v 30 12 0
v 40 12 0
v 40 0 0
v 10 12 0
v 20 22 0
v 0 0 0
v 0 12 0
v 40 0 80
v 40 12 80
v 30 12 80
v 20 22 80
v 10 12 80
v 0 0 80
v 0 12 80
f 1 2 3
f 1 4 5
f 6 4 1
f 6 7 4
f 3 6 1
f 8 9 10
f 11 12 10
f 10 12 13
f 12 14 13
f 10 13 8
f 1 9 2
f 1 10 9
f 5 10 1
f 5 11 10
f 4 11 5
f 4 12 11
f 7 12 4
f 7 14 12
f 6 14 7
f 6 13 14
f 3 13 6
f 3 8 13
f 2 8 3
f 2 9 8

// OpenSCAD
$fn = 32;

// ----------------------------------------------------------------------
// V guide rail: vrib, 40 mm wide
// ----------------------------------------------------------------------

// --- parameters (mm) ---
rail_w = 40;              // rail width, X
base_t = 12;              // base plate thickness
v_depth = 10;             // V feature depth / height
v_half_w = 10;            // half width of the V at the base face
plate_t = 80;             // rail length, Z (the extrusion height)

profile = [[0, 0], [40, 0], [40, 12], [30, 12], [20, 22], [10, 12], [0, 12]];  // primary outline, 7 points, counter clockwise

// --- the one profile operation ---
linear_extrude(height = plate_t) polygon(points = profile);
